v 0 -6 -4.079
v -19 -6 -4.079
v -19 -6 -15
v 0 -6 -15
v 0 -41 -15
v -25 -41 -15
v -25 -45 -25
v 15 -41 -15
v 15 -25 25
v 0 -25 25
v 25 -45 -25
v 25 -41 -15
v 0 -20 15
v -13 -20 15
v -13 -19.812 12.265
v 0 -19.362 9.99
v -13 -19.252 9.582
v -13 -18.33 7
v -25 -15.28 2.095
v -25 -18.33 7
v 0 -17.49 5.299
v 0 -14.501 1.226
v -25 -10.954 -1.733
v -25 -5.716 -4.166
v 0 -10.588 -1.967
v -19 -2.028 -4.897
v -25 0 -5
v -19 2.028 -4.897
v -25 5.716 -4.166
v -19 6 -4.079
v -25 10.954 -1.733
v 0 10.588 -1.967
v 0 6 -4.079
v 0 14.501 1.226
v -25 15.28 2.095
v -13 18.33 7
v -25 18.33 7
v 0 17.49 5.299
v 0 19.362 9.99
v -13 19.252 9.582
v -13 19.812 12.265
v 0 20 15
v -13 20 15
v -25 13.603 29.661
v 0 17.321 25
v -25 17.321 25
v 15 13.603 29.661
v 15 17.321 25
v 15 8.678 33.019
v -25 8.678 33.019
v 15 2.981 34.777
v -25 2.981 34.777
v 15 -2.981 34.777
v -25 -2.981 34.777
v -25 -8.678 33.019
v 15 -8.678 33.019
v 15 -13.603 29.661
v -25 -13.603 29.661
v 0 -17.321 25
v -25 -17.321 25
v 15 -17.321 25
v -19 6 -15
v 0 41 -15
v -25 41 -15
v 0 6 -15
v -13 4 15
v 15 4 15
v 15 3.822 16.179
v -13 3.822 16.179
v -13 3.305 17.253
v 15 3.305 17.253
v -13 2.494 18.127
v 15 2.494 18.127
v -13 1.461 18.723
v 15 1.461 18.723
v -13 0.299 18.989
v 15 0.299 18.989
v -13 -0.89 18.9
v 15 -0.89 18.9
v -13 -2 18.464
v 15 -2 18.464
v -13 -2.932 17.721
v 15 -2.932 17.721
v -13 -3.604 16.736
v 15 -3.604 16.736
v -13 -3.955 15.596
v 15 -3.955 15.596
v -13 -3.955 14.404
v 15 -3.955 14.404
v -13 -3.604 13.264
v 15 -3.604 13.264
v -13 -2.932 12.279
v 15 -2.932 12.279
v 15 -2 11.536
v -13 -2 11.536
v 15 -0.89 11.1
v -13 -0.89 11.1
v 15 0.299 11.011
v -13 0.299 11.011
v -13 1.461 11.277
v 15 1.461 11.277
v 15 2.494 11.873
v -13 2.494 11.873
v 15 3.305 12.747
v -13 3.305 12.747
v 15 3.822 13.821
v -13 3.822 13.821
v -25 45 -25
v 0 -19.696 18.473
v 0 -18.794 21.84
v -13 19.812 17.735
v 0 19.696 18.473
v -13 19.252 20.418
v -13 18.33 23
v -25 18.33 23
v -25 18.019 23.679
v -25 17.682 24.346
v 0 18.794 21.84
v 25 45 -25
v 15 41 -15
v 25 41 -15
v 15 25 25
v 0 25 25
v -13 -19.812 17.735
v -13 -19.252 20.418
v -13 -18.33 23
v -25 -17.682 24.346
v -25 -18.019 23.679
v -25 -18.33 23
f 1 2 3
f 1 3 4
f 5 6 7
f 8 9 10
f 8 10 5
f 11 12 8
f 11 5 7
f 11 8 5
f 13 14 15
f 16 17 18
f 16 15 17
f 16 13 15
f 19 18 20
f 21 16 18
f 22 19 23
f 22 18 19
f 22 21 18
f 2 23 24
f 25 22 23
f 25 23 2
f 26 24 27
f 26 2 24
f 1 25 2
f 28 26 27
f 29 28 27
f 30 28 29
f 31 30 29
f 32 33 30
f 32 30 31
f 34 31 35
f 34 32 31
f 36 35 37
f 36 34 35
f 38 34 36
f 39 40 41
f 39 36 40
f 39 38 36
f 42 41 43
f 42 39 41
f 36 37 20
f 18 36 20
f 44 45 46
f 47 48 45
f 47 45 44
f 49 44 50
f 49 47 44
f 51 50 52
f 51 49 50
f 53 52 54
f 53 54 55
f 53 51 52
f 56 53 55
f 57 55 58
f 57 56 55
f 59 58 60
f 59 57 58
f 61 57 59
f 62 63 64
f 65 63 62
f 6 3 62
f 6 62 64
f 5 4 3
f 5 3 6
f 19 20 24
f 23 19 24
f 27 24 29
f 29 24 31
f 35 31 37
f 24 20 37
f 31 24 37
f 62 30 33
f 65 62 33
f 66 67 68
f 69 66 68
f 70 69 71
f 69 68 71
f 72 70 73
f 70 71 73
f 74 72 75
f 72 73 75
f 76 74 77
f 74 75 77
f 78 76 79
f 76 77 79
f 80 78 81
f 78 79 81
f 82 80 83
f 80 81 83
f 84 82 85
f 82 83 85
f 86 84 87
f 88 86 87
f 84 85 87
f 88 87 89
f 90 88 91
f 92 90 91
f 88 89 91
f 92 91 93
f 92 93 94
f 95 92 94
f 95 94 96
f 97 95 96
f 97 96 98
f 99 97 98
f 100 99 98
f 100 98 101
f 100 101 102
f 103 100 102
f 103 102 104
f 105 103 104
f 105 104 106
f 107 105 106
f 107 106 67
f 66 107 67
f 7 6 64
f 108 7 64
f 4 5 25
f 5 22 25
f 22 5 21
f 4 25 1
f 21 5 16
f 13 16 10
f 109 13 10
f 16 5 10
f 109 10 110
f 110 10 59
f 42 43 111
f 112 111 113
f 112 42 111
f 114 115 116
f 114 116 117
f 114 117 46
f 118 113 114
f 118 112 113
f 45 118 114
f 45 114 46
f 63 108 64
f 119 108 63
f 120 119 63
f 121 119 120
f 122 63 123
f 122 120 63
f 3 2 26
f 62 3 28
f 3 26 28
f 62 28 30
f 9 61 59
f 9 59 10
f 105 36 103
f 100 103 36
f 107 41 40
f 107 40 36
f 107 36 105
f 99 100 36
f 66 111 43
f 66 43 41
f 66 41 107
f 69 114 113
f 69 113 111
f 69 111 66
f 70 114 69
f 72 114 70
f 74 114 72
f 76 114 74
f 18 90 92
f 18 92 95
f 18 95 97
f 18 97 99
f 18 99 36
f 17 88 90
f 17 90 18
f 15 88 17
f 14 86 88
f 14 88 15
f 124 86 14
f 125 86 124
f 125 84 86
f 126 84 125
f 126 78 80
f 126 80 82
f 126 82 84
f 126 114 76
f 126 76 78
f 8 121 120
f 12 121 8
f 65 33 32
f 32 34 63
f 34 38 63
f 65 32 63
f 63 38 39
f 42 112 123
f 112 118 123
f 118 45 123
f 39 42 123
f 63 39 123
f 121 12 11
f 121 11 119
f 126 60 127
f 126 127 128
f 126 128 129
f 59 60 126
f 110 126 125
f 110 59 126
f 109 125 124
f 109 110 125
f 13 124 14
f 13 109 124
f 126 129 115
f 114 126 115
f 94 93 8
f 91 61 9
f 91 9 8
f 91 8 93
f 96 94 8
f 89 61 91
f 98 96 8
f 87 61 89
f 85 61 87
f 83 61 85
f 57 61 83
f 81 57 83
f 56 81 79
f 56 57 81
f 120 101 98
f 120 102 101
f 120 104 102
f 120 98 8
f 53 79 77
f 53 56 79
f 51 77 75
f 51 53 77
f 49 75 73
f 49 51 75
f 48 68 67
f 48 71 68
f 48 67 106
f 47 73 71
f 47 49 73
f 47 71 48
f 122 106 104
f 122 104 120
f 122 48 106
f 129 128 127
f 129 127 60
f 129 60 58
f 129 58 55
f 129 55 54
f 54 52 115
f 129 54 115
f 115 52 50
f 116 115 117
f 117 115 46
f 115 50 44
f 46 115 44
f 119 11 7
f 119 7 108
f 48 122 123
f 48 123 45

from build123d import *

# Parameters (mm, degrees)
F0_W          = 50
F0_H          = 10
F1_DEPTH      = 25
F2_DEPTH      = 15
F3_DEPTH      = 15
F3_DEPTH_BACK = 25
F5_DEPTH      = 12
F6_D          = 8
F7_W          = 19
F7_H          = 12
F8_DEPTH      = 25


with BuildPart() as f1:
    # F0 (on Right) → F1 (new body, symmetric)
    with BuildSketch(Plane.YZ):
        Polygon((41, -15), (25, -15), (25, -25), (45, -25), align=None)
        with Locations((0, -20)):
            Rectangle(F0_W, F0_H)
        Polygon((-25, -15), (-41, -15), (-45, -25), (-25, -25), align=None)
    extrude(amount=F1_DEPTH, both=True)

    # F0 (on Right) → F2 (join)
    with BuildSketch(Plane.YZ):
        with BuildLine():
            Line((-20, 15), (-25, 15))
            Line((-25, 15), (-25, -15))
            Line((-25, -15), (25, -15))
            Line((25, -15), (25, 15))
            Line((25, 15), (20, 15))
            ThreePointArc((20, 15), (0, -5), (-20, 15))
        make_face()
        Polygon((41, -15), (25, 25), (25, 15), (25, -15), align=None)
        Polygon((-25, 15), (-25, 25), (-41, -15), (-25, -15), align=None)
        with BuildLine():
            Line((-17.3205080757, 25), (-25, 25))
            Line((-25, 25), (-25, 15))
            Line((-25, 15), (-20, 15))
            ThreePointArc((-20, 15), (-19.3185165258, 20.1763809021), (-17.3205080757, 25))
        make_face()
        with BuildLine():
            Line((25, 25), (17.3205080757, 25))
            ThreePointArc((17.3205080757, 25), (19.3185165258, 20.1763809021), (20, 15))
            Line((20, 15), (25, 15))
            Line((25, 15), (25, 25))
        make_face()
    extrude(amount=F2_DEPTH)

    # F0 (on Right) → F3 (join, two sides)
    with BuildSketch(Plane.YZ) as f3_sk:
        with BuildLine():
            ThreePointArc((17.3205080757, 25), (0, 35), (-17.3205080757, 25))
            Line((-17.3205080757, 25), (17.3205080757, 25))
        make_face()
        with BuildLine():
            Line((17.3205080757, 25), (-17.3205080757, 25))
            ThreePointArc((-17.3205080757, 25), (-19.3185165258, 20.1763809021), (-20, 15))
            Line((-20, 15), (20, 15))
            ThreePointArc((20, 15), (19.3185165258, 20.1763809021), (17.3205080757, 25))
        make_face()
        with BuildLine():
            Line((20, 15), (-20, 15))
            ThreePointArc((-20, 15), (0, -5), (20, 15))
        make_face()
    extrude(amount=F3_DEPTH)
    extrude(f3_sk.sketch, amount=-F3_DEPTH_BACK)

    # F4 (on face) → F5 (cut)
    with BuildSketch(Plane(origin=(-25, 0, 0), x_dir=(0, -1, 0), z_dir=(-1, 0, 0))):
        with BuildLine():
            ThreePointArc((20, 15), (19.5781262586, 19.0861928738), (18.3303027798, 23))
            Line((18.3303027798, 23), (-18.3303027798, 23))
            ThreePointArc((-18.3303027798, 23), (-19.5781262586, 19.0861928738), (-20, 15))
            Line((-20, 15), (20, 15))
        make_face()
        with BuildLine():
            ThreePointArc((18.3303027798, 7), (19.5781262586, 10.9138071262), (20, 15))
            Line((20, 15), (-20, 15))
            ThreePointArc((-20, 15), (-19.5781262586, 10.9138071262), (-18.3303027798, 7))
            Line((-18.3303027798, 7), (18.3303027798, 7))
        make_face()
    extrude(amount=-F5_DEPTH, mode=Mode.SUBTRACT)

    # F6 (through all)
    with Locations(Plane(origin=(-25, 0, 0), x_dir=(0, -1, 0), z_dir=(-1, 0, 0))):
        with Locations((0, 15)):
            Hole(F6_D / 2)

    # F7 (on Top) → F8 (join)
    with BuildSketch(Plane.XY):
        with Locations((-9.5, 0)):
            Rectangle(F7_W, F7_H)
    extrude(amount=-F8_DEPTH)


solid = f1.part
